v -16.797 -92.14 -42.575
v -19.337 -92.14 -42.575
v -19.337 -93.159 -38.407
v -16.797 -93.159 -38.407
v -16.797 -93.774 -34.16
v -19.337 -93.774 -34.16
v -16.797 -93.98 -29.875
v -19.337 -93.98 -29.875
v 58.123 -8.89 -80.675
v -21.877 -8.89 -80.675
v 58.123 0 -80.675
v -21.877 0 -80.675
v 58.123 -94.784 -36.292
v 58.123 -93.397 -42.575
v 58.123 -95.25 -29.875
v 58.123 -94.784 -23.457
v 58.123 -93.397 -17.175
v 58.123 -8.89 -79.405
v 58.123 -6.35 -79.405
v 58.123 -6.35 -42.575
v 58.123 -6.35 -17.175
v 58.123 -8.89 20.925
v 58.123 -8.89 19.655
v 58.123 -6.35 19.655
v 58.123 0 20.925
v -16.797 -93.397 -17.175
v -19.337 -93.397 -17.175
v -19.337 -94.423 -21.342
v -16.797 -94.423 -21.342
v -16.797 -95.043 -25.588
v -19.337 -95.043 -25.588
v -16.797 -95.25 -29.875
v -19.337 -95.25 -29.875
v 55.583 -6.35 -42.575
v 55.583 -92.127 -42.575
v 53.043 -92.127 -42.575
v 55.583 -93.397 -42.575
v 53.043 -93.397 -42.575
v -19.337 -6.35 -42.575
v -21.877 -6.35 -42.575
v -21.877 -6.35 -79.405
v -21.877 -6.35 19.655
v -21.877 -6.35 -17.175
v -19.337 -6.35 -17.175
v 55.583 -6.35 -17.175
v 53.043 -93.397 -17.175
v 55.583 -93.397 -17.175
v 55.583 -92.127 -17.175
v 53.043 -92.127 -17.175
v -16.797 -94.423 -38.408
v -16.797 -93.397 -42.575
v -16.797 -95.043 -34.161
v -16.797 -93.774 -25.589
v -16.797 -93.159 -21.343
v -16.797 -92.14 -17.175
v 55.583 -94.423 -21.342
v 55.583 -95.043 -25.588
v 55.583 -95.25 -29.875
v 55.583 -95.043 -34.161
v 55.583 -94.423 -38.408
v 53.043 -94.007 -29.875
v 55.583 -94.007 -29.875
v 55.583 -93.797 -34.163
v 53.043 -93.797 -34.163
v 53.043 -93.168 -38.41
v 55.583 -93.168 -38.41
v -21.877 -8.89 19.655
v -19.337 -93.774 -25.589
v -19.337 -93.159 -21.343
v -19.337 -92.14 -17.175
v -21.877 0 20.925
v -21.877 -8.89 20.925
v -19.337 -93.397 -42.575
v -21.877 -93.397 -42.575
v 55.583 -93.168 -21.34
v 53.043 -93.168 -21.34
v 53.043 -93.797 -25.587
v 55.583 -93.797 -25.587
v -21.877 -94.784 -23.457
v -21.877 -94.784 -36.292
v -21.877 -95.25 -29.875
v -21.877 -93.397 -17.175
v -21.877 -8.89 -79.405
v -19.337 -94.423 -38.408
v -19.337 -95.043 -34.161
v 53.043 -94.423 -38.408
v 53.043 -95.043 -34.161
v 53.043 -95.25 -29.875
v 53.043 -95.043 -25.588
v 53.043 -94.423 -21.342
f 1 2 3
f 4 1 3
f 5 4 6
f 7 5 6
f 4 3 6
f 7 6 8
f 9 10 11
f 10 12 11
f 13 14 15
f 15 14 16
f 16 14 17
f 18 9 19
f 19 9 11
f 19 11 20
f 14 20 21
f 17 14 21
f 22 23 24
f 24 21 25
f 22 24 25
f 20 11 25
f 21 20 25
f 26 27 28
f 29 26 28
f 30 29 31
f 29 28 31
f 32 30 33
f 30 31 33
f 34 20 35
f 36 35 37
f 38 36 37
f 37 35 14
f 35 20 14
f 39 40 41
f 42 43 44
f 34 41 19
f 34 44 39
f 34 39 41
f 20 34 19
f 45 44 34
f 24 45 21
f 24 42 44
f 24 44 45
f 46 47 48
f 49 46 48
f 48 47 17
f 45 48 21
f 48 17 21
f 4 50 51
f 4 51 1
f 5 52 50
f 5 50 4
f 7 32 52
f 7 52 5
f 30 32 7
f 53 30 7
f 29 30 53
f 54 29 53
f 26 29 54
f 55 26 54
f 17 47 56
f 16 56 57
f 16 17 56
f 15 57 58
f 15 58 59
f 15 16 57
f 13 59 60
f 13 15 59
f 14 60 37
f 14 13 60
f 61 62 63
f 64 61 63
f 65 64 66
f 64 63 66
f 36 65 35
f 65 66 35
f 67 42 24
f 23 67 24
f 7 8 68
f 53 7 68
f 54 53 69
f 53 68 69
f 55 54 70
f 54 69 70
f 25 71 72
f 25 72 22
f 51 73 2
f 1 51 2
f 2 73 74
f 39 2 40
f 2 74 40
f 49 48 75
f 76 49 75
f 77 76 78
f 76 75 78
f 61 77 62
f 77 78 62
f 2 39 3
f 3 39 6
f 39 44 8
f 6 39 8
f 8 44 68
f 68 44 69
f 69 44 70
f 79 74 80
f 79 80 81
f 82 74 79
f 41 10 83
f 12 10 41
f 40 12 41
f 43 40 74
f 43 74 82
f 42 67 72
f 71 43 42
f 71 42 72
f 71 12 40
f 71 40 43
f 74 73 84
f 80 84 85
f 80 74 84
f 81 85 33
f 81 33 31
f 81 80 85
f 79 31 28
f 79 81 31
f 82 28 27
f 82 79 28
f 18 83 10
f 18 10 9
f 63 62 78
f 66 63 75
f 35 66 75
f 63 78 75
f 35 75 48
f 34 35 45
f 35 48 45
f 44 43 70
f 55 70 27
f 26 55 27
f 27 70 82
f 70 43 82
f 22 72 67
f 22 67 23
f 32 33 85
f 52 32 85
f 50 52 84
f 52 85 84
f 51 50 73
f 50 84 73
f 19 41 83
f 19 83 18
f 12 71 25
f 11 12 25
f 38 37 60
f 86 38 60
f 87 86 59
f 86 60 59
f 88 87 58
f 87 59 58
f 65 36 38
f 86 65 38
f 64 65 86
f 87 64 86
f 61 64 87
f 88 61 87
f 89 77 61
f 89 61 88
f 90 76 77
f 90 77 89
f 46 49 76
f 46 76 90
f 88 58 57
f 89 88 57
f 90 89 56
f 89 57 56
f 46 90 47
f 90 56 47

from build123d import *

# Parameters (mm, degrees)
F0_W      = 80
F0_H      = 101.6
F1_DEPTH  = 6.35
F3_DEPTH  = 2.54
F5_DEPTH  = 2.54
F7_DEPTH  = 2.54
F9_DEPTH  = 2.54
F10_W     = 80
F10_H     = 1.27
F11_DEPTH = 2.54
F12_DEPTH = 2.54


with BuildPart() as f1:
    # F0 (on Front) → F1 (new body)
    with BuildSketch(Plane.XZ):
        with Locations((18.1234987736, -29.8747005124)):
            Rectangle(F0_W, F0_H)
    extrude(amount=F1_DEPTH)

    # F2 (on face) → F3 (join)
    with BuildSketch(Plane.YZ.offset(58.1234987736)):
        with BuildLine():
            Line((-93.3970949714, -42.5747005124), (-6.35, -42.5747005124))
            Line((-6.35, -42.5747005124), (-6.35, -29.8747005124))
            Line((-6.35, -29.8747005124), (-6.35, -17.1747005124))
            Line((-6.35, -17.1747005124), (-93.3970949714, -17.1747005124))
            ThreePointArc((-93.3970949714, -17.1747005124), (-95.25, -29.8747005124), (-93.3970949714, -42.5747005124))
        make_face()
    extrude(amount=-F3_DEPTH)

    # F4 (on face) → F5 (join)
    with BuildSketch(Plane(origin=(-21.8765012264, 0, 0), x_dir=(0, -1, 0), z_dir=(-1, 0, 0))):
        with BuildLine():
            Line((93.3970949714, -17.1747005124), (6.35, -17.1747005124))
            Line((6.35, -17.1747005124), (6.35, -42.5747005124))
            Line((6.35, -42.5747005124), (93.3970949714, -42.5747005124))
            ThreePointArc((93.3970949714, -42.5747005124), (95.25, -29.8747005124), (93.3970949714, -17.1747005124))
        make_face()
    extrude(amount=-F5_DEPTH)

    # F6 (on face) → F7 (join)
    with BuildSketch(Plane.YZ.offset(-19.3365012264)):
        with BuildLine():
            ThreePointArc((-95.25, -29.8747005124), (-94.7843345492, -36.2919284389), (-93.3970949714, -42.5747005124))
            Line((-93.3970949714, -42.5747005124), (-92.1396846861, -42.5747005124))
            ThreePointArc((-92.1396846861, -42.5747005124), (-93.5175310216, -36.2910226765), (-93.98, -29.8747005124))
            Line((-93.98, -29.8747005124), (-95.25, -29.8747005124))
        make_face()
        with BuildLine():
            ThreePointArc((-93.3970949714, -17.1747005124), (-94.7843345492, -23.4574725858), (-95.25, -29.8747005124))
            Line((-95.25, -29.8747005124), (-93.98, -29.8747005124))
            ThreePointArc((-93.98, -29.8747005124), (-93.5175310216, -23.4583783483), (-92.1396846861, -17.1747005124))
            Line((-92.1396846861, -17.1747005124), (-93.3970949714, -17.1747005124))
        make_face()
    extrude(amount=F7_DEPTH)

    # F8 (on face) → F9 (join)
    with BuildSketch(Plane(origin=(55.5834987736, 0, 0), x_dir=(0, -1, 0), z_dir=(-1, 0, 0))):
        with BuildLine():
            Line((94.006845472, -29.8747005124), (95.25, -29.8747005124))
            ThreePointArc((95.25, -29.8747005124), (94.7843345492, -23.4574725858), (93.3970949714, -17.1747005124))
            Line((93.3970949714, -17.1747005124), (92.1270949714, -17.1747005124))
            ThreePointArc((92.1270949714, -17.1747005124), (93.5343618687, -23.4555210098), (94.006845472, -29.8747005124))
        make_face()
        with BuildLine():
            ThreePointArc((93.3970949714, -42.5747005124), (94.7843345492, -36.2919284389), (95.25, -29.8747005124))
            Line((95.25, -29.8747005124), (94.006845472, -29.8747005124))
            ThreePointArc((94.006845472, -29.8747005124), (93.5343618687, -36.293880015), (92.1270949714, -42.5747005124))
            Line((92.1270949714, -42.5747005124), (93.3970949714, -42.5747005124))
        make_face()
    extrude(amount=F9_DEPTH)

    # F10 (on face) → F11 (join)
    with BuildSketch(Plane.XZ.offset(6.35)):
        with Locations((18.1234987736, 20.2902994876)):
            Rectangle(F10_W, F10_H)
    extrude(amount=F11_DEPTH)

    # F10 (on face) → F12 (join)
    with BuildSketch(Plane.XZ.offset(6.35)):
        with Locations((18.1234987736, -80.0397005124)):
            Rectangle(F10_W, F10_H)
    extrude(amount=F12_DEPTH)


solid = f1.part
